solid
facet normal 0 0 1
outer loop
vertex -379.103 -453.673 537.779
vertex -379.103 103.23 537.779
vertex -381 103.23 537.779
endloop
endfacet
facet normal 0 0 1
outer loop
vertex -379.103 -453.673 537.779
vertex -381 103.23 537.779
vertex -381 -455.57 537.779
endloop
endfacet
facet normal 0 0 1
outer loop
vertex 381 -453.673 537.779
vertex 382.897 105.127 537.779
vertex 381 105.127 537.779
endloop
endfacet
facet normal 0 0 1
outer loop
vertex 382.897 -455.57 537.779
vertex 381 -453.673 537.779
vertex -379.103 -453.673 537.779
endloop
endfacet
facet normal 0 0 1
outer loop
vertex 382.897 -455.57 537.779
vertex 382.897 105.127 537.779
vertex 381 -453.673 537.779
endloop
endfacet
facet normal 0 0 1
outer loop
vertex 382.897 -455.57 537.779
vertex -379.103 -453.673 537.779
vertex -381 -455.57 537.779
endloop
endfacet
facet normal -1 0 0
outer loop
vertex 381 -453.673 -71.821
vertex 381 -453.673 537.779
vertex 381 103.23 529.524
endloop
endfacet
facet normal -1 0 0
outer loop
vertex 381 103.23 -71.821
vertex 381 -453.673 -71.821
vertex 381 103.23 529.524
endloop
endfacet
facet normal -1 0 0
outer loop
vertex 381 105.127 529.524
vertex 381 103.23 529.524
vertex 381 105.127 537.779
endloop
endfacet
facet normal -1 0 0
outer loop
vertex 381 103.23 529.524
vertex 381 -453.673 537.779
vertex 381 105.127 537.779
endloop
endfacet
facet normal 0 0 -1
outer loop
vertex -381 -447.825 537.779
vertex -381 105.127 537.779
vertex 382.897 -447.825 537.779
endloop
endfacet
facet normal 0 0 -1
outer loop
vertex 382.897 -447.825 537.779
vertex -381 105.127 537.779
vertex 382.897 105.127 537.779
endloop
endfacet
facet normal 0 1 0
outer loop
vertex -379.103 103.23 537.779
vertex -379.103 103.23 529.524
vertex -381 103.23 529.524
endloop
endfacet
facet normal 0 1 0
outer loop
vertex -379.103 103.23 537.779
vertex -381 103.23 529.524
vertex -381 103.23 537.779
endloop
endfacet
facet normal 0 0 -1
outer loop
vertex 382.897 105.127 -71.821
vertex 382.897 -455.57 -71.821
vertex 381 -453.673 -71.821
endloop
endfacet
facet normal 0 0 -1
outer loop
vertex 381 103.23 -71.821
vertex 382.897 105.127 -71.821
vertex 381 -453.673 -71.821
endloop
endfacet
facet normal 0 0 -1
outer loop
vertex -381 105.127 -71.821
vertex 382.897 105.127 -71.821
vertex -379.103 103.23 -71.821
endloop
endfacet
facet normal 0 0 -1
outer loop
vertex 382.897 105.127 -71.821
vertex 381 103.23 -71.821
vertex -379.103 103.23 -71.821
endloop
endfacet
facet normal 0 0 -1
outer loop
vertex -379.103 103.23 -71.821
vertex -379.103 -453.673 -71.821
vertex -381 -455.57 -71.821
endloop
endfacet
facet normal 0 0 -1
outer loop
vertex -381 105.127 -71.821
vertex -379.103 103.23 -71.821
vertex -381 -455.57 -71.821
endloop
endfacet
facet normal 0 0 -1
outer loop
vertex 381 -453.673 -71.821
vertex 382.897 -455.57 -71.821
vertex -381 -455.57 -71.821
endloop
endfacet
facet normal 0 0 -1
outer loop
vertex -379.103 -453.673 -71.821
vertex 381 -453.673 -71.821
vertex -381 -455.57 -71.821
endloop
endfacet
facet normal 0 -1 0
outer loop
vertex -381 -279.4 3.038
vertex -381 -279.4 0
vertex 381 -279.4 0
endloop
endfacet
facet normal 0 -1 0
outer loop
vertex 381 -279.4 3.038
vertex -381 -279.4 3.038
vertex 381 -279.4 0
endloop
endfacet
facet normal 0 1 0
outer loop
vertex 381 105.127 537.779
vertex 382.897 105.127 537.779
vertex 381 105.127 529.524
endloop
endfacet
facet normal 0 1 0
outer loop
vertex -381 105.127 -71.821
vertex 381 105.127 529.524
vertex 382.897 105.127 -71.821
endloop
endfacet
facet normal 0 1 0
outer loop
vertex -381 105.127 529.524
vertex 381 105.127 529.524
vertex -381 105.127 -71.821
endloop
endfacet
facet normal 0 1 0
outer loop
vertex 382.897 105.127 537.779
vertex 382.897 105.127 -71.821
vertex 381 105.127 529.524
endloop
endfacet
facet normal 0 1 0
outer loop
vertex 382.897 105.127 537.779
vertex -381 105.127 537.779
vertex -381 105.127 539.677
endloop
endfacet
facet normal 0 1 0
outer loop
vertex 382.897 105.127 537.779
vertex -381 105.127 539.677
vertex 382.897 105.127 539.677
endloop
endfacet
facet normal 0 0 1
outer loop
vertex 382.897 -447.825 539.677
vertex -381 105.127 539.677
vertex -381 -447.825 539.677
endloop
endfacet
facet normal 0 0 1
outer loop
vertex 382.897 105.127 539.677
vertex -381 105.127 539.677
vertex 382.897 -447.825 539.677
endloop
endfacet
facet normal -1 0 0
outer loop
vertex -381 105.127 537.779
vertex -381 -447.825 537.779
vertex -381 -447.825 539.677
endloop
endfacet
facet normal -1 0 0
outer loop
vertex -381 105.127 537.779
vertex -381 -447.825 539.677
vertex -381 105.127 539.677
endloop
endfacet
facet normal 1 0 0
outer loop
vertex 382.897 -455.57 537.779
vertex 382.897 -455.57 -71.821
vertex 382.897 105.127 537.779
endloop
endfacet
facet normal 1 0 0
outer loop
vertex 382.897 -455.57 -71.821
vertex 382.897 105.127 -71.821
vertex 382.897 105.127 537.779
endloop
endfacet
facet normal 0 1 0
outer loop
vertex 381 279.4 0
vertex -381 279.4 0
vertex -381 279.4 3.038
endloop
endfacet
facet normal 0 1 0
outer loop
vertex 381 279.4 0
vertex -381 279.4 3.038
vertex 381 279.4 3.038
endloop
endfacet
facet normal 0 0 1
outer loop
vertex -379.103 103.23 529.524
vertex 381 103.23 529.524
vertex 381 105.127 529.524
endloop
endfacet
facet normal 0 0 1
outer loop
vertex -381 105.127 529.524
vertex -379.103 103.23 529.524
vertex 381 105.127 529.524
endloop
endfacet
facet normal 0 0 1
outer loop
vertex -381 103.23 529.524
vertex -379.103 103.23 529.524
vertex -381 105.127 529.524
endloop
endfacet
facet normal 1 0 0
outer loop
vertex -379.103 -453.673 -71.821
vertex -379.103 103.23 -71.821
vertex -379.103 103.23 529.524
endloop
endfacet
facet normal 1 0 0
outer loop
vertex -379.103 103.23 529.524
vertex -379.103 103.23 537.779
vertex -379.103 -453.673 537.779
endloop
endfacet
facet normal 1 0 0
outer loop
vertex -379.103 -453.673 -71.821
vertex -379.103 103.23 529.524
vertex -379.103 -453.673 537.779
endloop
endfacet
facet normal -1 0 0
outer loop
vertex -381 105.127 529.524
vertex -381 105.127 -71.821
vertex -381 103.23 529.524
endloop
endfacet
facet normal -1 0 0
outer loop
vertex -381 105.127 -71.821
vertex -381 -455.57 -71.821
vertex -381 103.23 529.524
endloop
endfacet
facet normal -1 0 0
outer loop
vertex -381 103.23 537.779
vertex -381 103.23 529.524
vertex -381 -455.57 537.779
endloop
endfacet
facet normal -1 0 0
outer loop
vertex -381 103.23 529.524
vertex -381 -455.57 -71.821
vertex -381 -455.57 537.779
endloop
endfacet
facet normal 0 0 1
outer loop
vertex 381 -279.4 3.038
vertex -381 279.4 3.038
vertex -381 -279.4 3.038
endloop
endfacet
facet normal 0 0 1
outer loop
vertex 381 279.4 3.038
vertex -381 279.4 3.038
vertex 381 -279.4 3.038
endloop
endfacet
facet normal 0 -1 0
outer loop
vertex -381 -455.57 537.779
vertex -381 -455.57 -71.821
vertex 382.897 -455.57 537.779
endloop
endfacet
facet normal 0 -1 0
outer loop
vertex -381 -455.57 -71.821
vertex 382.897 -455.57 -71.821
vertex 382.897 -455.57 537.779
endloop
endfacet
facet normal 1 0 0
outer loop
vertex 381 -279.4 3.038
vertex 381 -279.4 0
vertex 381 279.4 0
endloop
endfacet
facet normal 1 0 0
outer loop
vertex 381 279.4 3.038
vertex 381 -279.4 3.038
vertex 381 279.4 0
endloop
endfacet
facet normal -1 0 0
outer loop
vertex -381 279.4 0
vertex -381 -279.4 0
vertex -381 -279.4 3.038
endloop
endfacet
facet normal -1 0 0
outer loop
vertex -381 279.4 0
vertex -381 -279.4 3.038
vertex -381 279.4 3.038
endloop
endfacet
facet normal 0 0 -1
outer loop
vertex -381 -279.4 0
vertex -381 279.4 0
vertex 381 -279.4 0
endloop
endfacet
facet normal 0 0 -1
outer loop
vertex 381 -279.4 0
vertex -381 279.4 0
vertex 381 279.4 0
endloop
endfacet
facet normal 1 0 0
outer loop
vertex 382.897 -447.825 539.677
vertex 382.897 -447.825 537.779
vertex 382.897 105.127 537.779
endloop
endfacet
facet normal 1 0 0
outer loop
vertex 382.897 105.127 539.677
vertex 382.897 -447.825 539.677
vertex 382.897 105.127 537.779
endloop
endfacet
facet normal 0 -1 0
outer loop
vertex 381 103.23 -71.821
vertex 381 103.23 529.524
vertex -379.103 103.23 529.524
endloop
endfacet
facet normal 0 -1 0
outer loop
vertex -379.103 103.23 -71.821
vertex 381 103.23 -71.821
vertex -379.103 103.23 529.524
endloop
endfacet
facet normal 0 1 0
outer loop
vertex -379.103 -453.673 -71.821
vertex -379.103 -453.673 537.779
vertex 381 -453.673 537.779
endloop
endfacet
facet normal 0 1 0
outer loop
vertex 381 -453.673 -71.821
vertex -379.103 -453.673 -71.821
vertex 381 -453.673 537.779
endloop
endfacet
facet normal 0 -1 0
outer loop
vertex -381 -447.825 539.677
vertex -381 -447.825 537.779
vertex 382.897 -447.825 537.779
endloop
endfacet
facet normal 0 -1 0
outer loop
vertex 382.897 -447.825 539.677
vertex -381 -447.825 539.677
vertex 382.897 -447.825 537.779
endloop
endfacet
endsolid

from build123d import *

# Parameters (mm, degrees)
F0_W      = 762
F0_H      = 558.8
F1_DEPTH  = 3.03784
F2_W      = 558.8
F2_H      = 609.6
F3_DEPTH  = 1.89738
F4_W      = 762
F4_H      = 609.6
F5_DEPTH  = 1.89738
F6_W      = 558.8
F6_H      = 609.6
F7_DEPTH  = 1.89738
F8_W      = 762
F8_H      = 601.345
F9_DEPTH  = 1.89738
F10_W     = 763.89738
F10_H     = 552.9529485043
F11_DEPTH = 1.89738


with BuildPart() as f1:
    # F0 (on Top) → F1 (new body)
    with BuildSketch(Plane.XY):
        Rectangle(F0_W, F0_H)
    extrude(amount=F1_DEPTH)


with BuildPart() as f3:
    # F2 (on face) → F3 (new body)
    with BuildSketch(Plane.YZ.offset(381)):
        with Locations((-174.2725175381, 232.979187201)):
            Rectangle(F2_W, F2_H)
    extrude(amount=F3_DEPTH)

    # F4 (on face) → F5 (join)
    with BuildSketch(Plane.XZ.offset(453.6725175381)):
        with Locations((1.89738, 232.979187201)):
            Rectangle(F4_W, F4_H)
    extrude(amount=F5_DEPTH)

    # F6 (on face) → F7 (join)
    with BuildSketch(Plane(origin=(-379.10262, 0, 0), x_dir=(0, -1, 0), z_dir=(-1, 0, 0))):
        with Locations((176.1698975381, 232.979187201)):
            Rectangle(F6_W, F6_H)
    extrude(amount=F7_DEPTH)

    # F8 (on face) → F9 (join)
    with BuildSketch(Plane(origin=(0, 103.2301024619, 0), x_dir=(-1, 0, 0), z_dir=(0, 1, 0))):
        with Locations((0, 228.851687201)):
            Rectangle(F8_W, F8_H)
    extrude(amount=F9_DEPTH)


with BuildPart() as f11:
    # F10 (on face) → F11 (new body)
    with BuildSketch(Plane.XY.offset(537.779187201)):
        with Locations((0.94869, -171.3489917902)):
            Rectangle(F10_W, F10_H)
    extrude(amount=F11_DEPTH)


solid = Compound([f1.part, f3.part, f11.part])
